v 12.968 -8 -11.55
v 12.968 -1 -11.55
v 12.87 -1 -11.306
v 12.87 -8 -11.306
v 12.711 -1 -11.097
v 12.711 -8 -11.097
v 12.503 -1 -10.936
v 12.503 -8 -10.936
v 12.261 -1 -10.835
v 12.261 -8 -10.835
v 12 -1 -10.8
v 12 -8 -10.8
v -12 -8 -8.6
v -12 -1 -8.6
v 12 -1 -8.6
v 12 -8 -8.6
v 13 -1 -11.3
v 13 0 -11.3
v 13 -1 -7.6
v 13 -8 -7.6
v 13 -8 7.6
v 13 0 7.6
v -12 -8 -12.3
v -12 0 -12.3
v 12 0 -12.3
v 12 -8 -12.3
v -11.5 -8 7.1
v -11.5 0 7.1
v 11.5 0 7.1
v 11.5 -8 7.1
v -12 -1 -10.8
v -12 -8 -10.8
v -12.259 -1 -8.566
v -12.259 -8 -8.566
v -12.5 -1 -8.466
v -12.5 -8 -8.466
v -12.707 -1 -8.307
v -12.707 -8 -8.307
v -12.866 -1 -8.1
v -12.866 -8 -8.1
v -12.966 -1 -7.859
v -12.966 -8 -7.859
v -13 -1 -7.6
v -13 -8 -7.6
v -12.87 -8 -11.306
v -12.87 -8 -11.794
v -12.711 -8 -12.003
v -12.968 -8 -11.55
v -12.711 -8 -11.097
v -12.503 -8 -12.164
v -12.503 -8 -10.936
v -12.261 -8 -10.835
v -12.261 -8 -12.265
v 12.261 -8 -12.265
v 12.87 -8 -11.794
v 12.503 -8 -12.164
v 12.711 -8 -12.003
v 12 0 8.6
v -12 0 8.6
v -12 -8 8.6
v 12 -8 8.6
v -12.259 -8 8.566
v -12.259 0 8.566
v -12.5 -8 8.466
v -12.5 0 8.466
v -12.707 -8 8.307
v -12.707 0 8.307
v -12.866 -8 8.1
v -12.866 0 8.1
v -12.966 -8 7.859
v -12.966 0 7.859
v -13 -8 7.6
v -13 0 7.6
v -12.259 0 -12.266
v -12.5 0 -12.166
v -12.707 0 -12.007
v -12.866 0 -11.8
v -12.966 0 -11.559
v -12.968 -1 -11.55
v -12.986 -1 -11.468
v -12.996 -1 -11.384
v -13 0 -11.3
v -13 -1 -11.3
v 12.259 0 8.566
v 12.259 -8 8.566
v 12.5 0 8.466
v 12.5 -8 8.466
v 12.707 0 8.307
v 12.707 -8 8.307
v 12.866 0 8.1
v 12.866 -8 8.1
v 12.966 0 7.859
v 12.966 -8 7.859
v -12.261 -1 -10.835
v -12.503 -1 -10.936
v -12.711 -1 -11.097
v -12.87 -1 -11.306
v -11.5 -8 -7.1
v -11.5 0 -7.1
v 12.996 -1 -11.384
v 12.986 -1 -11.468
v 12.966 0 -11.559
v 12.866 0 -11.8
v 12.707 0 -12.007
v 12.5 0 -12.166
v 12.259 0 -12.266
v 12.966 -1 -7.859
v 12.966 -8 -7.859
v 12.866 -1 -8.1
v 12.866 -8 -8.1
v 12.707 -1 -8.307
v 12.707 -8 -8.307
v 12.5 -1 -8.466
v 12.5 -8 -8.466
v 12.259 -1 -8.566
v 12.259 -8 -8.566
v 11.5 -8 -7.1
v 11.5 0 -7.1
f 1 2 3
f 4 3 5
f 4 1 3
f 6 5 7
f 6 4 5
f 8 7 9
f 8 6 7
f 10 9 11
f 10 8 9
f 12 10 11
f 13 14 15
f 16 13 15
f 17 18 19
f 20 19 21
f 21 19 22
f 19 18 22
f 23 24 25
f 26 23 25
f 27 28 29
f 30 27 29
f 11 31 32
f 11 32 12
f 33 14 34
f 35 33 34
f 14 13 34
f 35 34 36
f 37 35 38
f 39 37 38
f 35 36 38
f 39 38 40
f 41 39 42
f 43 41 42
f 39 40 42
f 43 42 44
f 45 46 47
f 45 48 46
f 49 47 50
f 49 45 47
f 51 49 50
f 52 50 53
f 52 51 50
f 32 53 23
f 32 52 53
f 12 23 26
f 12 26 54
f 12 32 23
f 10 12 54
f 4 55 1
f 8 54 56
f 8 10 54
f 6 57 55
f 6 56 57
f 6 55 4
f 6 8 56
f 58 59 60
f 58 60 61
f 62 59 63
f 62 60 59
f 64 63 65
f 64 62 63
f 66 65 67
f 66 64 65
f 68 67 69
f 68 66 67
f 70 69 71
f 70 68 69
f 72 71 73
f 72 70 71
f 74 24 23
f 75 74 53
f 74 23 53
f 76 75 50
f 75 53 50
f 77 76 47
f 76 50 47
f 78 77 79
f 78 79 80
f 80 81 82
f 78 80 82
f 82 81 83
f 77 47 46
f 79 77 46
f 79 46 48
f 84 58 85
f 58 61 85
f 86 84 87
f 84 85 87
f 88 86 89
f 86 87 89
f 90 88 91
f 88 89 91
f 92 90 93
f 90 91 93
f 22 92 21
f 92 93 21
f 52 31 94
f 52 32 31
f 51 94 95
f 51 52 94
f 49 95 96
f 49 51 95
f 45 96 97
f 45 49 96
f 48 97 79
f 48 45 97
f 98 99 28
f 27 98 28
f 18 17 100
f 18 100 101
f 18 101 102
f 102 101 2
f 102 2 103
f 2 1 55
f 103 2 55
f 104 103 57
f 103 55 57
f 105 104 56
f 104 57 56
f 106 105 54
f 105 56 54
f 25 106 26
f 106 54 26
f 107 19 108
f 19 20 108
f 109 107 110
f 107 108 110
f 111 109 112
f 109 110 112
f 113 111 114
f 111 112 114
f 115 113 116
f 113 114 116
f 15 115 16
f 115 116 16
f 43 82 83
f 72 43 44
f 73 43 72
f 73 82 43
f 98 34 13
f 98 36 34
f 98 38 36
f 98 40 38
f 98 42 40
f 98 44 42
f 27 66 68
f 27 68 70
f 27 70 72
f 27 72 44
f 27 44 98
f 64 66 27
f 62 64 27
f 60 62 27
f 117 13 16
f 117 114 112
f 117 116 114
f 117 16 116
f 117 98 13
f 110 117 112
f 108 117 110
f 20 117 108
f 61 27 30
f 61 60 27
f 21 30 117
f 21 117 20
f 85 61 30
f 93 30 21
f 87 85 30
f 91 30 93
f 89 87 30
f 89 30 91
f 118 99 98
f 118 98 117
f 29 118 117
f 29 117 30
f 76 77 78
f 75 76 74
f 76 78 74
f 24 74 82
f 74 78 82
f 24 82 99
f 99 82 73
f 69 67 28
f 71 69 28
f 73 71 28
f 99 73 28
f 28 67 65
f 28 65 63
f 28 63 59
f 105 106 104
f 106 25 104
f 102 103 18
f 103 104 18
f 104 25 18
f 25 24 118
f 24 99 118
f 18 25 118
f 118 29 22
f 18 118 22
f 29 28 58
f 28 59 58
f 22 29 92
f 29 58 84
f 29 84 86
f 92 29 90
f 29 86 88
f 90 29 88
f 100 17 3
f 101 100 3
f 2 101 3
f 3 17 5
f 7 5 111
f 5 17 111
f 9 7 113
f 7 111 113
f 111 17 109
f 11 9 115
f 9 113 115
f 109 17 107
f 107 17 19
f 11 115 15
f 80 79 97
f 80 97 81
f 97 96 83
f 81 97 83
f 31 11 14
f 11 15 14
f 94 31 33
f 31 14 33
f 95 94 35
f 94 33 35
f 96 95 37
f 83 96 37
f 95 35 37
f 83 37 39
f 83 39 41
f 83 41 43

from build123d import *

# Parameters (mm, degrees)
F0_W     = 26
F0_H     = 17.2
F0_W_2   = 23
F0_H_2   = 14.2
F1_DEPTH = 8
F0_H_3   = 1.5
F2_W     = 26
F2_H     = 5.2
F3_DEPTH = 1
F4_F1_R  = 1
F4_F2_R  = 1
F4_F3_R  = 1
F4_F4_R  = 1
F4_F5_R  = 1
F4_F6_R  = 1
F4_F7_R  = 1
F4_F8_R  = 1


with BuildPart() as f1:
    # F0 (on Front) → F1 (new body)
    with BuildSketch(Plane.XZ):
        Rectangle(F0_W, F0_H)
        Rectangle(F0_W_2, F0_H_2, mode=Mode.SUBTRACT)
    extrude(amount=F1_DEPTH)



with BuildPart() as f1b:
    # F0 (on Front) → F1, piece 2 (new body)
    with BuildSketch(Plane.XZ):
        with Locations((0, -11.55)):
            Rectangle(F0_W, F0_H_3)
    extrude(amount=F1_DEPTH)


with BuildPart() as f1_1:
    add(f1.part)

    add(f1b.part)  # F3 merges F1b
    # F2 (on face) → F3 (join)
    with BuildSketch(Plane(origin=(0, 0, 0), x_dir=(-1, 0, 0), z_dir=(0, 1, 0))):
        with Locations((0, -9.7)):
            Rectangle(F2_W, F2_H)
    extrude(amount=-F3_DEPTH)

    # F4: fillet of radius 1 on 8 edges, made by hand

    # F4_f1
    f4_f1_edges = [f1_1.edges().sort_by_distance(p)[0] for p in [
        (13, -4.5, -8.6),
    ]]
    fillet(f4_f1_edges, radius=F4_F1_R)

    # F4_f2
    f4_f2_edges = [f1_1.edges().sort_by_distance(p)[0] for p in [
        (-13, -4.5, -8.6),
    ]]
    fillet(f4_f2_edges, radius=F4_F2_R)

    # F4_f3
    f4_f3_edges = [f1_1.edges().sort_by_distance(p)[0] for p in [
        (-13, -4.5, -10.8),
    ]]
    fillet(f4_f3_edges, radius=F4_F3_R)

    # F4_f4
    f4_f4_edges = [f1_1.edges().sort_by_distance(p)[0] for p in [
        (13, -4.5, -10.8),
    ]]
    fillet(f4_f4_edges, radius=F4_F4_R)

    # F4_f5
    f4_f5_edges = [f1_1.edges().sort_by_distance(p)[0] for p in [
        (13, -4, 8.6),
    ]]
    fillet(f4_f5_edges, radius=F4_F5_R)

    # F4_f6
    f4_f6_edges = [f1_1.edges().sort_by_distance(p)[0] for p in [
        (-13, -4, 8.6),
    ]]
    fillet(f4_f6_edges, radius=F4_F6_R)

    # F4_f7
    f4_f7_edges = [f1_1.edges().sort_by_distance(p)[0] for p in [
        (13, -4, -12.3),
    ]]
    fillet(f4_f7_edges, radius=F4_F7_R)

    # F4_f8
    f4_f8_edges = [f1_1.edges().sort_by_distance(p)[0] for p in [
        (-13, -4, -12.3),
    ]]
    fillet(f4_f8_edges, radius=F4_F8_R)


solid = f1_1.part
